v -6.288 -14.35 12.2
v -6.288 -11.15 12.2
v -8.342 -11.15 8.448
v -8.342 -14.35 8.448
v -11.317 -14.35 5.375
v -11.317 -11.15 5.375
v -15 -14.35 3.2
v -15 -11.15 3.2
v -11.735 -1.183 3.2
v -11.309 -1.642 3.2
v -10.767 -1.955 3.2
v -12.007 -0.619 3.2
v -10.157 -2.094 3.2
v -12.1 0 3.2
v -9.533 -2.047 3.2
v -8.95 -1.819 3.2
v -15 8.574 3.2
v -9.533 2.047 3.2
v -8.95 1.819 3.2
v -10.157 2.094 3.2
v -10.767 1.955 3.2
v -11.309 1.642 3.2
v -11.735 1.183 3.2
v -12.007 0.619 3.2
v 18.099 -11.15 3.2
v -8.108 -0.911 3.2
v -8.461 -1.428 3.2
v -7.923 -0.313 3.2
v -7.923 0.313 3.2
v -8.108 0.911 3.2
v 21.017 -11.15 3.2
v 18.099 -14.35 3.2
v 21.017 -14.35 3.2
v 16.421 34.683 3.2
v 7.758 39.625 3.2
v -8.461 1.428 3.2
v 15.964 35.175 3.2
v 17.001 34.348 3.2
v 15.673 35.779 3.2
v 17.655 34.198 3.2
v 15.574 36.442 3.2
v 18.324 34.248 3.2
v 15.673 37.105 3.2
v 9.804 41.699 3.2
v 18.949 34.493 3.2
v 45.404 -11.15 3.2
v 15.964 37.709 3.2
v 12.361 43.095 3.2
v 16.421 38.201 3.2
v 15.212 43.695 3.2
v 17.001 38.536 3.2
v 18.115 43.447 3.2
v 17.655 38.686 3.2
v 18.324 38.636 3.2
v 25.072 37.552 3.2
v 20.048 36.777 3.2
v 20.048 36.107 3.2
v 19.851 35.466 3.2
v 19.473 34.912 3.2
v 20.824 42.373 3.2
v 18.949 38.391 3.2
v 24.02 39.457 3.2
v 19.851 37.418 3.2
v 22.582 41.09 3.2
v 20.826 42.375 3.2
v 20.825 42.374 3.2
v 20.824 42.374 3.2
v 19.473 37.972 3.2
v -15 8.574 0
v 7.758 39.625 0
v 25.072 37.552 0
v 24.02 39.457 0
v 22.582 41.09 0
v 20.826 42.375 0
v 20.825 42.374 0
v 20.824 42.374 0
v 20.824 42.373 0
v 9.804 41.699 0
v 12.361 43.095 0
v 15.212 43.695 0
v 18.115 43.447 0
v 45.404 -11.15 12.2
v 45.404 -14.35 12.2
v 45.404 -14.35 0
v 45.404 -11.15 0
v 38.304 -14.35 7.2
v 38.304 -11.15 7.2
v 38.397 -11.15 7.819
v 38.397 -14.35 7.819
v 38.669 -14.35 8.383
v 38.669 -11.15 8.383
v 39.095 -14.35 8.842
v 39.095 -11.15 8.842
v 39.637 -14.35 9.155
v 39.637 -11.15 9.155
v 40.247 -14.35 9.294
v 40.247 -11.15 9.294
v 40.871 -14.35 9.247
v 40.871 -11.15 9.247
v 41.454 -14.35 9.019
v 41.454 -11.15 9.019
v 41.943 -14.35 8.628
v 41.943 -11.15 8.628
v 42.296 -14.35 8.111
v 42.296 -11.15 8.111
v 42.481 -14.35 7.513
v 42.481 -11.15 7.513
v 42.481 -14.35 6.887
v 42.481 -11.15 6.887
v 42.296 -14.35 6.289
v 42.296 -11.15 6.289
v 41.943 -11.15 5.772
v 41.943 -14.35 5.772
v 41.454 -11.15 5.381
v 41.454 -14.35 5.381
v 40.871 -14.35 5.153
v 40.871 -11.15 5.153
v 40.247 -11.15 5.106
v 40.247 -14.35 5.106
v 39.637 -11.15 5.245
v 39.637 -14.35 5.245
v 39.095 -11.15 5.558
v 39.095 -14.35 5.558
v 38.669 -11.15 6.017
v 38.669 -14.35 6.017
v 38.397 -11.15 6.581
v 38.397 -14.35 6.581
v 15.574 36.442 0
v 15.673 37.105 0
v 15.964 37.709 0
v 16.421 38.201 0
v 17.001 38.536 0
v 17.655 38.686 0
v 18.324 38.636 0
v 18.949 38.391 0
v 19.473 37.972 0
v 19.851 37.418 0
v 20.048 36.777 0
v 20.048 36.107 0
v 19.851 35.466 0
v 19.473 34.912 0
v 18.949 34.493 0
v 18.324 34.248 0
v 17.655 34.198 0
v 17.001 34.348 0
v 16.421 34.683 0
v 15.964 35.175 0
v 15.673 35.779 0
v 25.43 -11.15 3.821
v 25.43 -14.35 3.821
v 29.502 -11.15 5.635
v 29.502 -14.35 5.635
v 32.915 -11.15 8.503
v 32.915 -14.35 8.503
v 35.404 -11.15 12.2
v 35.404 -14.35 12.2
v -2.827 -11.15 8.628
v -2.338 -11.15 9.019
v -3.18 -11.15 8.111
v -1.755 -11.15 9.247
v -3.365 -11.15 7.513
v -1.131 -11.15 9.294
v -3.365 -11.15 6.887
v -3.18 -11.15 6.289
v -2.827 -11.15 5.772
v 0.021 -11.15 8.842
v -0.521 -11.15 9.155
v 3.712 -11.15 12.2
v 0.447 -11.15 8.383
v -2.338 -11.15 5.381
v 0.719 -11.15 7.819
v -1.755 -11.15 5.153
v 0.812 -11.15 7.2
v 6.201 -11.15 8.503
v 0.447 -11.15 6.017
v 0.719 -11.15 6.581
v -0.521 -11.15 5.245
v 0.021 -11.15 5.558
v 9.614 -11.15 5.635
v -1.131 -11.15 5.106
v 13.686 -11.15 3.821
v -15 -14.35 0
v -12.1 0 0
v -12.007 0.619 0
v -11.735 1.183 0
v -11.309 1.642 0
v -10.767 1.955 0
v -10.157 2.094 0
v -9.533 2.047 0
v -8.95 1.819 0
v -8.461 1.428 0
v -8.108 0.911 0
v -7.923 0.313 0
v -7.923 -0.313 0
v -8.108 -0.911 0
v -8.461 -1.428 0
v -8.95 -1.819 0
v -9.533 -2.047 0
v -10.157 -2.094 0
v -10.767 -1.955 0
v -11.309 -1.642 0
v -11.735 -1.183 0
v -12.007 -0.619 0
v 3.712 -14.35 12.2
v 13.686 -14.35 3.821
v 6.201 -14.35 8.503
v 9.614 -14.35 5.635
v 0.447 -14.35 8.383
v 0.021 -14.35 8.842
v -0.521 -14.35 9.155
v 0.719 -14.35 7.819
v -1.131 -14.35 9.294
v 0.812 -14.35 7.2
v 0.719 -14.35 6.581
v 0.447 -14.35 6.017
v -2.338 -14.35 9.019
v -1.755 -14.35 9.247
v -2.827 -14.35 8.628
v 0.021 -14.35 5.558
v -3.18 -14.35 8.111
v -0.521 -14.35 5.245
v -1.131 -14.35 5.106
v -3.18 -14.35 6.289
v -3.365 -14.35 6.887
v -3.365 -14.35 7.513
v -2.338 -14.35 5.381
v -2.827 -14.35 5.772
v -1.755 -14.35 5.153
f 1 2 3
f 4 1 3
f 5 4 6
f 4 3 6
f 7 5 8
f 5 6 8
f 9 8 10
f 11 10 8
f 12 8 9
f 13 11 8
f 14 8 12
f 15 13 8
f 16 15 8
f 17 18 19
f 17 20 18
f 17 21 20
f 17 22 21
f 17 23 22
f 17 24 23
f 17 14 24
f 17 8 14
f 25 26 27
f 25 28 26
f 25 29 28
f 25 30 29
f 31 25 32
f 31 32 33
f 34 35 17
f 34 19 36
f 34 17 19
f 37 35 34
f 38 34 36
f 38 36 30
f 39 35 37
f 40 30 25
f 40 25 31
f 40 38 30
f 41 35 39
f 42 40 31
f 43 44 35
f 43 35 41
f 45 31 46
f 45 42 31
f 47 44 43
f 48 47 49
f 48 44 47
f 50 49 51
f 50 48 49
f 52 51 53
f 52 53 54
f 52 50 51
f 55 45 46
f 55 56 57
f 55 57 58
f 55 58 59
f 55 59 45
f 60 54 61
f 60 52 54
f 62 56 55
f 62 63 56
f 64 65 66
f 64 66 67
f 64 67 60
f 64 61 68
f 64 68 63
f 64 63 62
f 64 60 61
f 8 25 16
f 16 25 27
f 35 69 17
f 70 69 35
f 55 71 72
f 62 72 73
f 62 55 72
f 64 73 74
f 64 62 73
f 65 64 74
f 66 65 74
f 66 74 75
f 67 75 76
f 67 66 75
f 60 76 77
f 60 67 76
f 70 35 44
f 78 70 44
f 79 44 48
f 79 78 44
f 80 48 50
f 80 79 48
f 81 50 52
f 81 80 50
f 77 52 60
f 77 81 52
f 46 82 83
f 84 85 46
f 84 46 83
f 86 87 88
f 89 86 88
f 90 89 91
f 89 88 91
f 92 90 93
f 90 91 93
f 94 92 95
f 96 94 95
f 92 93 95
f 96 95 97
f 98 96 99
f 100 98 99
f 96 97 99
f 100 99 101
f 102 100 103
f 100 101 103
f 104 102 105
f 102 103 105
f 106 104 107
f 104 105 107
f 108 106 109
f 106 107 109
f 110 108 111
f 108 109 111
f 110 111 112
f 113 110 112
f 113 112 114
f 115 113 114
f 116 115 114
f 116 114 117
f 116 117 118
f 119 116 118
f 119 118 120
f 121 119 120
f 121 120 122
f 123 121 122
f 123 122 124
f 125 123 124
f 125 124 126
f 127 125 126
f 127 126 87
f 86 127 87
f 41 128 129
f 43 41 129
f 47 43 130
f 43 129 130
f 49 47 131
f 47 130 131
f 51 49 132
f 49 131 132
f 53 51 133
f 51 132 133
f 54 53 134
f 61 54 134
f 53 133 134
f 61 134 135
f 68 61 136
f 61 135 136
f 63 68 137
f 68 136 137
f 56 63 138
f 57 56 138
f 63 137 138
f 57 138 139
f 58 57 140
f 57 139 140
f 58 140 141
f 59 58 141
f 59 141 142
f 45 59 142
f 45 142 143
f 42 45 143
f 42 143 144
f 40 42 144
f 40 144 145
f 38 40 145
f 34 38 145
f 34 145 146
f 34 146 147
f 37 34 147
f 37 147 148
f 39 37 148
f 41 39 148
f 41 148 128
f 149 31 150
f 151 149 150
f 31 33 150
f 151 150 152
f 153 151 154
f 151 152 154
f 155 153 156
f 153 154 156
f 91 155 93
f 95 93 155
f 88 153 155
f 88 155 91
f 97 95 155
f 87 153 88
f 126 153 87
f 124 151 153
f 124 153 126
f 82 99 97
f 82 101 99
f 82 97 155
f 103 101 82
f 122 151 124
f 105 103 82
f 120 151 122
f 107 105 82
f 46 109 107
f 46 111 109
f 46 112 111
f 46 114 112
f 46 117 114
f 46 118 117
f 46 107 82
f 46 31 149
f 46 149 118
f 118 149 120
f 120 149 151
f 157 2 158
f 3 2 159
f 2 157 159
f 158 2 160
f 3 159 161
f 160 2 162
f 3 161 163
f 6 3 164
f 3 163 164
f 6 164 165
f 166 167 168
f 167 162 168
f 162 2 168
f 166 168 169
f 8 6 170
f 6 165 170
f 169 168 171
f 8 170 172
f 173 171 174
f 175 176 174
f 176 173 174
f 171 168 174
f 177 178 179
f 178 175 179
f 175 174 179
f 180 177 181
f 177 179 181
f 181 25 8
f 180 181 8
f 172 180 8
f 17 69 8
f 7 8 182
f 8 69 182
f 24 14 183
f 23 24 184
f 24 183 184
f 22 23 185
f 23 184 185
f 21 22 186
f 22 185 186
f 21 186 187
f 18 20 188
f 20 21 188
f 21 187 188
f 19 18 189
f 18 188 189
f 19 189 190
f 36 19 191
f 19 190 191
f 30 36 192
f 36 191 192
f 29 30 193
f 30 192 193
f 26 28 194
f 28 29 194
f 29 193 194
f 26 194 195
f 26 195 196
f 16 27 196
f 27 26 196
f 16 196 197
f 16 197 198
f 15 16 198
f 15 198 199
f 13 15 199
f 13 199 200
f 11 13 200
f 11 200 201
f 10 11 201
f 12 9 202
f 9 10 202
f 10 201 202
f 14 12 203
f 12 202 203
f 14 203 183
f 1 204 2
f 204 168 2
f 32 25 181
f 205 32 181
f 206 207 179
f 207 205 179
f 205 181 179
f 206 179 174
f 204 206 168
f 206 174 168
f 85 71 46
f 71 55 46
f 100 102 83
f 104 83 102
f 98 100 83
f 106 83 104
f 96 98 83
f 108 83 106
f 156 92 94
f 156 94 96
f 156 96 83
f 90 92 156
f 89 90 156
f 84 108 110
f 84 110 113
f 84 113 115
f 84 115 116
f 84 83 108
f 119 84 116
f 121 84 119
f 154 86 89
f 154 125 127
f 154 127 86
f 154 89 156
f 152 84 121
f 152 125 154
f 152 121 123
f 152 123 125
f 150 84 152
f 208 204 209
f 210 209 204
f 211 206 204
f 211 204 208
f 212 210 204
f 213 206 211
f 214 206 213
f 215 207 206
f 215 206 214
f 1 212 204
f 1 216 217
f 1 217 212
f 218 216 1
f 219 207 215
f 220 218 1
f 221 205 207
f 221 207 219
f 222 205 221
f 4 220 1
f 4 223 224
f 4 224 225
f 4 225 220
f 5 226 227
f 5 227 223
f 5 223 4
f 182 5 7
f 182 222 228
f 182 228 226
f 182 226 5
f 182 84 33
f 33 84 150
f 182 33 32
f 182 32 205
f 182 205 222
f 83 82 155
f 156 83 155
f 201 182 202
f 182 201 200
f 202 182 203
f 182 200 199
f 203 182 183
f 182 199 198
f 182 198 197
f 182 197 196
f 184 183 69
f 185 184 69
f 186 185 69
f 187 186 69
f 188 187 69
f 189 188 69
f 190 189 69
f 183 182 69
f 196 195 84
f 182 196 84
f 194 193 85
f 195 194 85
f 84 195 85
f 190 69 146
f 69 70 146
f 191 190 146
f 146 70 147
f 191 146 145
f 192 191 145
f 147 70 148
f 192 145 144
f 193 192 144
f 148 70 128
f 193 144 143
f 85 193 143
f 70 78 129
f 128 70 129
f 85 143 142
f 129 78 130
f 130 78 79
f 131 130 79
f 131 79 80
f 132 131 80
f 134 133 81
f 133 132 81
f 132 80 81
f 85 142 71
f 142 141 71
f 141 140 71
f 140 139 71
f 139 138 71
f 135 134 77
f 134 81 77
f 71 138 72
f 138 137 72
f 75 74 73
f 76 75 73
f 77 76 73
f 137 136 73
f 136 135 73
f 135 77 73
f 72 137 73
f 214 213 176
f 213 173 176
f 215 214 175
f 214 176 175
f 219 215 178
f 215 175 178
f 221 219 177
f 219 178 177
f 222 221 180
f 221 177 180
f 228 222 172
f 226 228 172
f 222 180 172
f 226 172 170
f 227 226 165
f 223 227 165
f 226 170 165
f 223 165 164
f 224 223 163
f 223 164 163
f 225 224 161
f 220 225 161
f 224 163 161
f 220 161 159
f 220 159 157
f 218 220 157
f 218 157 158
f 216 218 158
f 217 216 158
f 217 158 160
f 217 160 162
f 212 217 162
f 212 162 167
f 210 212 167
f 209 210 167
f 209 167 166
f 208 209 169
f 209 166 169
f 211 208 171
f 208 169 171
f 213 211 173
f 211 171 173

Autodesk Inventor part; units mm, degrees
ref_plane "YZ Plane" through (0, 0, 0) normal (1, 0, 0) x (0, 1, 0)
ref_plane "XZ Plane" through (0, 0, 0) normal (0, 1, 0) x (-1, 0, 0)
ref_plane "XY Plane" through (0, 0, 0) normal (0, 0, 1) x (1, 0, 0)
sketch "Эскиз1" plane through (0, 0, 0) normal (0, 0, 1) x (1, 0, 0)
  circle A0 centre (0, 0) radius 2.1
  line L0 (-5, 14.35) -> (5, 14.35)
  line L1 (5, 14.35) -> (5, -14.35)
  line L2 (5, -14.35) -> (-5, -14.35)
  line L3 (-5, -14.35) -> (-5, 14.35)
  line L4 (-5, 14.35) -> (5, -14.35) construction
  line L5 (5, 14.35) -> (-5, -14.35) construction
  line L6 (-5, 7) -> (5, 7)
  dimension "d0" = 4.2
  dimension "d2" = 10
  dimension "d3" = 28.7
  dimension "d4" = 7
extrude "Выдавливание1" add sketch "Эскиз1" along normal blind 3.2 contours L6 L1 L2 L3
sketch "Эскиз2" plane through (0, 0, 3.2) normal (0, 0, 1) x (1, 0, 0)
  line L0 (5, -14.35) -> (5, 7) projected
  line L1 (5, -14.35) -> (-5, -14.35)
  line L2 (-5, -14.35) -> (-5, -11.15)
  line L3 (-5, -11.15) -> (5, -11.15)
  line L4 (5, -11.15) -> (5, -14.35)
  point P0 (0, 0)
  point P1 (5, -11.15)
  dimension "d7" = 10
  dimension "d8" = 3.2
extrude "Выдавливание2" add sketch "Эскиз2" along normal blind 13
sketch "Эскиз3" plane through (-5, -11.15, 16.2) normal (0, 1, 0) x (1, 0, 0)
  line L0 (0, 10) -> (10, 10) projected
  line L1 (5, 10) -> (5, 0)
  line L2 (0, 0) -> (10, 0) projected
  circle A0 centre (5, 5) radius 2.1
  point P0 (5, 16.2)
  dimension "d12" = 4.2
extrude "Выдавливание3" cut sketch "Эскиз3" against normal blind 13
sketch "Эскиз4" plane through (0, 0, 3.2) normal (0, 0, 1) x (1, 0, 0)
  circle A0 centre (27.823512, 36.442015) radius 2.691667
  line L0 (25.598764, 34.926903) -> (0, 0)
  line L1 (17.757888, 39.624709) -> (-5, 8.573892)
  line L2 (-5, 7) -> (-5, -11.15)
  line L3 (-5, 7) -> (-5, 8.573892)
  line L4 (-5, -14.35) -> (5, -14.35)
  line L5 (5, -14.35) -> (5, -11.15)
  line L6 (5, -11.15) -> (-5, -11.15)
  line L7 (-5, -11.15) -> (-5, -14.35)
  line L8 (27.823512, 36.442015) -> (27.823512, -3.381482)
  line L9 (35.823512, 33.713219) -> (35.823512, -14.35)
  arc A1 (35.823512, 33.713219) -> (17.757888, 39.624709) centre (25.823512, 33.713219) ccw
  line L10 (-5, -14.35) -> (35.823512, -14.35)
  circle A2 centre (27.823512, 36.442015) radius 2.25
  line L11 (-5, 8.573892) -> (-5, -14.35)
  circle A3 centre (0, 0) radius 2.1
  point P0 (-5, -8.15)
  point P1 (-5, -11.15)
  dimension "d15" = 10
  dimension "d16" = 8
  dimension "d17" = 10
  dimension "d18" = 4.5
extrude "Выдавливание4" add sketch "Эскиз4" against normal up to surface (3.2 mm away) contours A0 | A1 L9 L10 L5 L6 L2 L3 L1
ref_plane "РабПлоскость1" through (20.202, -14.35, 16.2) normal (-1, 0, 0) x (0, 0, 1)
mirror "Зеркальное отражение1" about plane through (20.202, -14.35, 16.2) normal (-1, 0, 0) of "Выдавливание2", "Выдавливание3"
sketch "Эскиз6" plane through (0, 0, 0) normal (0, 0, -1) x (-1, 0, 0)
  circle A0 centre (-17.823512, 36.442015) radius 2.25
  circle A1 centre (10, 0) radius 2.1
  line L0 (5, -14.35) -> (-35.823512, -14.35)
  line L1 (5, -14.35) -> (5, 8.573892)
  line L2 (15, 8.573892) -> (-7.757888, 39.624709)
  arc A2 (-7.757888, 39.624709) -> (-25.823512, 33.713219) centre (-15.823512, 33.713219) ccw
  line L3 (-25.823512, 33.713219) -> (-25.823512, -14.35)
  circle A3 centre (-27.823512, 36.442015) radius 2.25
  circle A4 centre (0, 0) radius 2.1
  line L4 (5, -14.35) -> (-35.823512, -14.35)
  line L5 (5, -14.35) -> (5, 8.573892)
  line L6 (5, 8.573892) -> (-17.757888, 39.624709)
  arc A5 (-17.757888, 39.624709) -> (-35.823512, 33.713219) centre (-25.823512, 33.713219) ccw
  line L7 (-35.823512, 33.713219) -> (-35.823512, -14.35)
  line L8 (-35.823512, -14.35) -> (-35.823512, -11.15)
  line L9 (-35.823512, -11.15) -> (-45.404, -11.15)
  line L10 (-45.404, -11.15) -> (-45.404, -14.35)
  line L11 (-45.404, -14.35) -> (-35.823512, -14.35)
  line L12 (-25.823512, -14.35) -> (-45.404, -14.35)
  line L13 (0, 0) -> (10, 0)
  line L14 (15, 8.573892) -> (15, -18.0489)
  line L15 (-5, -14.35) -> (-35.404, -14.35)
  line L16 (-8, -14.35) -> (16.577235, -14.35)
  line L17 (-45.404, -11.15) -> (-35.708646, 35.224555)
  point P0 (-10, 0)
  point P1 (-20.823512, 42.373473)
  point P2 (15, -14.35)
  point P3 (-16.942673, 38.512431)
  point P4 (-15.583961, 36.658607)
  point P5 (5, 8.573892)
  dimension "d35" = 10
extrude "Выдавливание5" add sketch "Эскиз6" against normal up to surface (3.2 mm away) contours A0 L6 A5 A2 L2 L14 L16 L1 | A5 L7 L9 L17 | L9 L7 L11 L10
extrude "Выдавливание6" cut sketch "Эскиз6" against normal blind 10 contours A0 L6 | L6 A0 | A1
sketch "Эскиз7" plane through (0, 0, 3.2) normal (0, 0, 1) x (1, 0, 0)
  circle A0 centre (0, 0) radius 2.1
  line L0 (35.404, -14.35) -> (35.404, -11.15)
  line L1 (5, -14.35) -> (35.404, -14.35)
  arc A1 (35.708646, 35.224555) -> (20.823512, 42.373473) centre (25.823512, 33.713219) ccw
  line L2 (30.823512, 42.373473) -> (-5, -8.15)
  line L3 (35.404, -11.15) -> (45.404, -11.15)
  arc A2 (20.823512, 42.373473) -> (7.757888, 39.624709) centre (15.823512, 33.713219) ccw
  line L4 (-15, 8.573892) -> (7.757888, 39.624709)
  line L5 (-15, -14.35) -> (-15, 8.573892)
  line L6 (-5, -14.35) -> (-15, -14.35)
  line L7 (-5, -11.15) -> (-5, -14.35)
  circle A3 centre (17.823512, 36.442015) radius 2.25
  circle A4 centre (17.823512, 36.442015) radius 2.25
  circle A5 centre (27.823512, 36.442015) radius 2.25
  circle A6 centre (0, 0) radius 2.1
  circle A7 centre (-10, 0) radius 2.1
  line L8 (5, -14.35) -> (35.404, -14.35)
  line L9 (35.404, -14.35) -> (35.404, -11.15)
  line L10 (35.404, -11.15) -> (45.404, -11.15)
  arc A8 (35.708646, 35.224555) -> (20.823512, 42.373473) centre (25.823512, 33.713219) ccw
  arc A9 (20.823512, 42.373473) -> (7.757888, 39.624709) centre (15.823512, 33.713219) ccw
  line L11 (-15, 8.573892) -> (7.757888, 39.624709)
  line L12 (-15, -14.35) -> (-15, 8.573892)
  line L13 (-5, -14.35) -> (-15, -14.35)
  line L14 (-5, -11.15) -> (-5, -14.35)
  line L15 (35.708646, 35.224555) -> (45.404, -11.15)
  line L16 (35.708646, 35.224555) -> (45.404, -11.15)
  circle A10 centre (15.823537, 33.690994) radius 10.021745
  circle A11 centre (25.823512, 33.713219) radius 10
  line L17 (35.708646, 35.224555) -> (-5, 35.224555)
  line L18 (45.404, -11.15) -> (25.071691, 37.551955)
  line L19 (5, -14.35) -> (5, -11.15)
  line L20 (5, -14.35) -> (5, -11.15)
  line L21 (-5, -11.15) -> (5, -11.15)
  line L22 (-5, -11.15) -> (5, -11.15)
  point P0 (-0.639537, -2.000248)
  point P1 (1.675949, 1.265384)
  point P2 (20.826018, 42.374919)
extrude "Выдавливание7" add sketch "Эскиз7" against normal up to surface (3.2 mm away) contours A0 L2 | L2 A0 | L17 L18 L2 A5 | A5 L18 L17 | A5 L17 L18 | L2 L18 A5 | L17 A5 L2 L18 | L2 A5 L18
sketch "Эскиз7 outline for Выдавливание8" plane through (0, 0, 3.2) normal (0, 0, 1) x (1, 0, 0)
  arc A0 (35.708646, 35.224555) -> (20.826018, 42.374919) centre (25.823512, 33.713219) ccw
  line L0 (45.404, -11.15) -> (35.708646, 35.224555)
  line L1 (25.071691, 37.551955) -> (45.404, -11.15)
  arc A1 (20.826018, 42.374919) -> (25.071691, 37.551955) centre (15.823537, 33.690994) cw
extrude "Выдавливание8" cut sketch "Эскиз7 outline for Выдавливание8" against normal blind 10
sketch "Эскиз9" plane through (-5, -11.15, 16.2) normal (0, 1, 0) x (1, 0, 0)
  circle A0 centre (3.712, 5) radius 2.1
  line L0 (-1.288, 10) -> (8.712, 10)
  line L1 (-1.288, 10) -> (-1.288, 0)
  line L2 (8.712, 0) -> (-1.288, 0)
  line L3 (8.712, 13) -> (8.712, 0)
  line L4 (50.404, 13) -> (30.071691, 13)
  line L5 (30.071691, 13) -> (25.826018, 13)
  line L6 (25.826018, 13) -> (25.823512, 13)
  line L7 (12.757888, 13) -> (25.823512, 13)
  line L8 (-10, 13) -> (12.757888, 13)
  line L9 (0, 13) -> (-10, 13)
  line L10 (10, 13) -> (40.404, 13)
  line L11 (25.073512, 13) -> (20.573512, 13)
  line L12 (-7.1, 13) -> (-2.9, 13)
  line L13 (-1.288, 10) -> (-1.288, 15.274869)
  line L14 (0, 13) -> (0, 0)
  line L15 (0, 13) -> (0, 0)
  circle A1 centre (5, 5) radius 2.1
  line L16 (0, 13) -> (0, 0)
  line L17 (10, 0) -> (0, 0)
  line L18 (10, 13) -> (10, 0)
  line L19 (0, 13) -> (10, 13)
  line L20 (0, 13) -> (10, 13)
  line L21 (8.712, 10) -> (12.757888, 10)
  line L22 (3.712, 5) -> (3.712, 9)
  circle A2 centre (3.712, 9) radius 2.1
  line L23 (11.441296, 4) -> (-2.9, 4)
  line L24 (40.404, 13) -> (50.404, 13)
  point P0 (5, 16.2)
  point P1 (0, 10)
  point P2 (-1.288, 13)
  point P3 (0, 10)
  point P4 (-1.288, 4)
  point P5 (8.712, 4)
  dimension "d42" = 4
  dimension "d43" = 4.2
  dimension "d44" = 4
extrude "Выдавливание10" add sketch "Эскиз9" against normal up to surface (3.2 mm away) contours A0 L23 A1 | A0 A1 L23 | A1 L22 A2 A0 | A0 A2 L0 L3 L23 A1 | L23 A1 A0 | A0 A1 L23 | A2 L22 A0 | A0 A2 L0 | A1 L23 A0 A2 L22 | A1 L23 L3 L2 L14 A0 | A0 L23 A1 | L22 A2 A0 | L23 L14 L0 A2 A0 | L23 L1 L0 L14 | L14 L2 L1 L23 | L0 L13 L8 L14
extrude "Выдавливание11" cut sketch "Эскиз9" against normal blind 10 contours L23 A1 A0 | A0 A1 L23 | A2 L22 A0 | A0 A2 L0 | A1 L23 L3 L2 L14 A0 | A0 L23 A1 | L22 A2 A0 | L23 L18 L17 L3 | L3 L21 L18 L23 | L0 A2 | L14 L2 L1 L23 | L3 L8 L18 L21 picked at (6.324605, 3.867911) picked at (4.682533, 3.889371) picked at (2.387395, 3.867911)
ref_plane "РабПлоскость2" through (19.558, -14.35, 16.2) normal (-1, 0, 0) x (0, 0, 1)
mirror "Зеркальное отражение2" about plane through (19.558, -14.35, 16.2) normal (-1, 0, 0) of "Выдавливание11", "Выдавливание10"
fillet "Сопряжение5" radius 16 3 edges at (35.404, -12.75, 3.2) (3.712, -12.75, 3.2) (-6.288, -12.75, 3.2)
properties part number "мертвое колесо 3"
